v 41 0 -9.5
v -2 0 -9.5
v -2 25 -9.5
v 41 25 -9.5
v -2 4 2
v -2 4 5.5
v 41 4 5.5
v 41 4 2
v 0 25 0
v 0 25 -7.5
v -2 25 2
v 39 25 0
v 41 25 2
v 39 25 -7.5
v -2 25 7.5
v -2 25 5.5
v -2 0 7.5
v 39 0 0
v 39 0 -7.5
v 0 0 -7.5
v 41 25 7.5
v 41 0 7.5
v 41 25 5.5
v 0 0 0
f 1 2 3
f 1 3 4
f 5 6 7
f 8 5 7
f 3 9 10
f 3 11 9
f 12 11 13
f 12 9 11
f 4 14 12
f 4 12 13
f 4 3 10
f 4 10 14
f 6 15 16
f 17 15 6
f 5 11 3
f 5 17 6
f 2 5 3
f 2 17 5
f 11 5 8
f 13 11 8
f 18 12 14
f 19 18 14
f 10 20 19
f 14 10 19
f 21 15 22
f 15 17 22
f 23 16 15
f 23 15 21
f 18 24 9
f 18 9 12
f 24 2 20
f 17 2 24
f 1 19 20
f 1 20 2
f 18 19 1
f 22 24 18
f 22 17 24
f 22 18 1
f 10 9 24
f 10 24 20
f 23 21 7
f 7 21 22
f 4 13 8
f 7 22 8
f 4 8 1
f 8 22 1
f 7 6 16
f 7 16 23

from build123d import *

# Parameters (mm, degrees)
SKETCH1_W           = 43
SKETCH1_H           = 11.5
SKETCH1_W_2         = 39
SKETCH1_H_2         = 7.5
BOSS_EXTRUDE1_DEPTH = 25
SKETCH2_W           = 43
SKETCH2_H           = 5.5
BOSS_EXTRUDE2_DEPTH = 4
SKETCH3_W           = 43
SKETCH3_H           = 2
BOSS_EXTRUDE3_DEPTH = 21


with BuildPart() as part:
    # Sketch1 → Boss-Extrude1 (new body)
    with BuildSketch(Plane(origin=(0, 0, 0), x_dir=(1, 0, 0), z_dir=(0, 1, 0))):
        with Locations((19.5, 3.75)):
            Rectangle(SKETCH1_W, SKETCH1_H)
        with Locations((19.5, 3.75)):
            Rectangle(SKETCH1_W_2, SKETCH1_H_2, mode=Mode.SUBTRACT)
    extrude(amount=BOSS_EXTRUDE1_DEPTH)

    # Sketch2 → Boss-Extrude2 (add)
    with BuildSketch(Plane.XZ):
        with Locations((19.5, 4.75)):
            Rectangle(SKETCH2_W, SKETCH2_H)
    extrude(amount=-BOSS_EXTRUDE2_DEPTH)

    # Sketch3 → Boss-Extrude3 (add)
    with BuildSketch(Plane(origin=(0, 4, 0), x_dir=(1, 0, 0), z_dir=(0, 1, 0))):
        with Locations((19.5, -6.5)):
            Rectangle(SKETCH3_W, SKETCH3_H)
    extrude(amount=BOSS_EXTRUDE3_DEPTH)


solid = part.part
